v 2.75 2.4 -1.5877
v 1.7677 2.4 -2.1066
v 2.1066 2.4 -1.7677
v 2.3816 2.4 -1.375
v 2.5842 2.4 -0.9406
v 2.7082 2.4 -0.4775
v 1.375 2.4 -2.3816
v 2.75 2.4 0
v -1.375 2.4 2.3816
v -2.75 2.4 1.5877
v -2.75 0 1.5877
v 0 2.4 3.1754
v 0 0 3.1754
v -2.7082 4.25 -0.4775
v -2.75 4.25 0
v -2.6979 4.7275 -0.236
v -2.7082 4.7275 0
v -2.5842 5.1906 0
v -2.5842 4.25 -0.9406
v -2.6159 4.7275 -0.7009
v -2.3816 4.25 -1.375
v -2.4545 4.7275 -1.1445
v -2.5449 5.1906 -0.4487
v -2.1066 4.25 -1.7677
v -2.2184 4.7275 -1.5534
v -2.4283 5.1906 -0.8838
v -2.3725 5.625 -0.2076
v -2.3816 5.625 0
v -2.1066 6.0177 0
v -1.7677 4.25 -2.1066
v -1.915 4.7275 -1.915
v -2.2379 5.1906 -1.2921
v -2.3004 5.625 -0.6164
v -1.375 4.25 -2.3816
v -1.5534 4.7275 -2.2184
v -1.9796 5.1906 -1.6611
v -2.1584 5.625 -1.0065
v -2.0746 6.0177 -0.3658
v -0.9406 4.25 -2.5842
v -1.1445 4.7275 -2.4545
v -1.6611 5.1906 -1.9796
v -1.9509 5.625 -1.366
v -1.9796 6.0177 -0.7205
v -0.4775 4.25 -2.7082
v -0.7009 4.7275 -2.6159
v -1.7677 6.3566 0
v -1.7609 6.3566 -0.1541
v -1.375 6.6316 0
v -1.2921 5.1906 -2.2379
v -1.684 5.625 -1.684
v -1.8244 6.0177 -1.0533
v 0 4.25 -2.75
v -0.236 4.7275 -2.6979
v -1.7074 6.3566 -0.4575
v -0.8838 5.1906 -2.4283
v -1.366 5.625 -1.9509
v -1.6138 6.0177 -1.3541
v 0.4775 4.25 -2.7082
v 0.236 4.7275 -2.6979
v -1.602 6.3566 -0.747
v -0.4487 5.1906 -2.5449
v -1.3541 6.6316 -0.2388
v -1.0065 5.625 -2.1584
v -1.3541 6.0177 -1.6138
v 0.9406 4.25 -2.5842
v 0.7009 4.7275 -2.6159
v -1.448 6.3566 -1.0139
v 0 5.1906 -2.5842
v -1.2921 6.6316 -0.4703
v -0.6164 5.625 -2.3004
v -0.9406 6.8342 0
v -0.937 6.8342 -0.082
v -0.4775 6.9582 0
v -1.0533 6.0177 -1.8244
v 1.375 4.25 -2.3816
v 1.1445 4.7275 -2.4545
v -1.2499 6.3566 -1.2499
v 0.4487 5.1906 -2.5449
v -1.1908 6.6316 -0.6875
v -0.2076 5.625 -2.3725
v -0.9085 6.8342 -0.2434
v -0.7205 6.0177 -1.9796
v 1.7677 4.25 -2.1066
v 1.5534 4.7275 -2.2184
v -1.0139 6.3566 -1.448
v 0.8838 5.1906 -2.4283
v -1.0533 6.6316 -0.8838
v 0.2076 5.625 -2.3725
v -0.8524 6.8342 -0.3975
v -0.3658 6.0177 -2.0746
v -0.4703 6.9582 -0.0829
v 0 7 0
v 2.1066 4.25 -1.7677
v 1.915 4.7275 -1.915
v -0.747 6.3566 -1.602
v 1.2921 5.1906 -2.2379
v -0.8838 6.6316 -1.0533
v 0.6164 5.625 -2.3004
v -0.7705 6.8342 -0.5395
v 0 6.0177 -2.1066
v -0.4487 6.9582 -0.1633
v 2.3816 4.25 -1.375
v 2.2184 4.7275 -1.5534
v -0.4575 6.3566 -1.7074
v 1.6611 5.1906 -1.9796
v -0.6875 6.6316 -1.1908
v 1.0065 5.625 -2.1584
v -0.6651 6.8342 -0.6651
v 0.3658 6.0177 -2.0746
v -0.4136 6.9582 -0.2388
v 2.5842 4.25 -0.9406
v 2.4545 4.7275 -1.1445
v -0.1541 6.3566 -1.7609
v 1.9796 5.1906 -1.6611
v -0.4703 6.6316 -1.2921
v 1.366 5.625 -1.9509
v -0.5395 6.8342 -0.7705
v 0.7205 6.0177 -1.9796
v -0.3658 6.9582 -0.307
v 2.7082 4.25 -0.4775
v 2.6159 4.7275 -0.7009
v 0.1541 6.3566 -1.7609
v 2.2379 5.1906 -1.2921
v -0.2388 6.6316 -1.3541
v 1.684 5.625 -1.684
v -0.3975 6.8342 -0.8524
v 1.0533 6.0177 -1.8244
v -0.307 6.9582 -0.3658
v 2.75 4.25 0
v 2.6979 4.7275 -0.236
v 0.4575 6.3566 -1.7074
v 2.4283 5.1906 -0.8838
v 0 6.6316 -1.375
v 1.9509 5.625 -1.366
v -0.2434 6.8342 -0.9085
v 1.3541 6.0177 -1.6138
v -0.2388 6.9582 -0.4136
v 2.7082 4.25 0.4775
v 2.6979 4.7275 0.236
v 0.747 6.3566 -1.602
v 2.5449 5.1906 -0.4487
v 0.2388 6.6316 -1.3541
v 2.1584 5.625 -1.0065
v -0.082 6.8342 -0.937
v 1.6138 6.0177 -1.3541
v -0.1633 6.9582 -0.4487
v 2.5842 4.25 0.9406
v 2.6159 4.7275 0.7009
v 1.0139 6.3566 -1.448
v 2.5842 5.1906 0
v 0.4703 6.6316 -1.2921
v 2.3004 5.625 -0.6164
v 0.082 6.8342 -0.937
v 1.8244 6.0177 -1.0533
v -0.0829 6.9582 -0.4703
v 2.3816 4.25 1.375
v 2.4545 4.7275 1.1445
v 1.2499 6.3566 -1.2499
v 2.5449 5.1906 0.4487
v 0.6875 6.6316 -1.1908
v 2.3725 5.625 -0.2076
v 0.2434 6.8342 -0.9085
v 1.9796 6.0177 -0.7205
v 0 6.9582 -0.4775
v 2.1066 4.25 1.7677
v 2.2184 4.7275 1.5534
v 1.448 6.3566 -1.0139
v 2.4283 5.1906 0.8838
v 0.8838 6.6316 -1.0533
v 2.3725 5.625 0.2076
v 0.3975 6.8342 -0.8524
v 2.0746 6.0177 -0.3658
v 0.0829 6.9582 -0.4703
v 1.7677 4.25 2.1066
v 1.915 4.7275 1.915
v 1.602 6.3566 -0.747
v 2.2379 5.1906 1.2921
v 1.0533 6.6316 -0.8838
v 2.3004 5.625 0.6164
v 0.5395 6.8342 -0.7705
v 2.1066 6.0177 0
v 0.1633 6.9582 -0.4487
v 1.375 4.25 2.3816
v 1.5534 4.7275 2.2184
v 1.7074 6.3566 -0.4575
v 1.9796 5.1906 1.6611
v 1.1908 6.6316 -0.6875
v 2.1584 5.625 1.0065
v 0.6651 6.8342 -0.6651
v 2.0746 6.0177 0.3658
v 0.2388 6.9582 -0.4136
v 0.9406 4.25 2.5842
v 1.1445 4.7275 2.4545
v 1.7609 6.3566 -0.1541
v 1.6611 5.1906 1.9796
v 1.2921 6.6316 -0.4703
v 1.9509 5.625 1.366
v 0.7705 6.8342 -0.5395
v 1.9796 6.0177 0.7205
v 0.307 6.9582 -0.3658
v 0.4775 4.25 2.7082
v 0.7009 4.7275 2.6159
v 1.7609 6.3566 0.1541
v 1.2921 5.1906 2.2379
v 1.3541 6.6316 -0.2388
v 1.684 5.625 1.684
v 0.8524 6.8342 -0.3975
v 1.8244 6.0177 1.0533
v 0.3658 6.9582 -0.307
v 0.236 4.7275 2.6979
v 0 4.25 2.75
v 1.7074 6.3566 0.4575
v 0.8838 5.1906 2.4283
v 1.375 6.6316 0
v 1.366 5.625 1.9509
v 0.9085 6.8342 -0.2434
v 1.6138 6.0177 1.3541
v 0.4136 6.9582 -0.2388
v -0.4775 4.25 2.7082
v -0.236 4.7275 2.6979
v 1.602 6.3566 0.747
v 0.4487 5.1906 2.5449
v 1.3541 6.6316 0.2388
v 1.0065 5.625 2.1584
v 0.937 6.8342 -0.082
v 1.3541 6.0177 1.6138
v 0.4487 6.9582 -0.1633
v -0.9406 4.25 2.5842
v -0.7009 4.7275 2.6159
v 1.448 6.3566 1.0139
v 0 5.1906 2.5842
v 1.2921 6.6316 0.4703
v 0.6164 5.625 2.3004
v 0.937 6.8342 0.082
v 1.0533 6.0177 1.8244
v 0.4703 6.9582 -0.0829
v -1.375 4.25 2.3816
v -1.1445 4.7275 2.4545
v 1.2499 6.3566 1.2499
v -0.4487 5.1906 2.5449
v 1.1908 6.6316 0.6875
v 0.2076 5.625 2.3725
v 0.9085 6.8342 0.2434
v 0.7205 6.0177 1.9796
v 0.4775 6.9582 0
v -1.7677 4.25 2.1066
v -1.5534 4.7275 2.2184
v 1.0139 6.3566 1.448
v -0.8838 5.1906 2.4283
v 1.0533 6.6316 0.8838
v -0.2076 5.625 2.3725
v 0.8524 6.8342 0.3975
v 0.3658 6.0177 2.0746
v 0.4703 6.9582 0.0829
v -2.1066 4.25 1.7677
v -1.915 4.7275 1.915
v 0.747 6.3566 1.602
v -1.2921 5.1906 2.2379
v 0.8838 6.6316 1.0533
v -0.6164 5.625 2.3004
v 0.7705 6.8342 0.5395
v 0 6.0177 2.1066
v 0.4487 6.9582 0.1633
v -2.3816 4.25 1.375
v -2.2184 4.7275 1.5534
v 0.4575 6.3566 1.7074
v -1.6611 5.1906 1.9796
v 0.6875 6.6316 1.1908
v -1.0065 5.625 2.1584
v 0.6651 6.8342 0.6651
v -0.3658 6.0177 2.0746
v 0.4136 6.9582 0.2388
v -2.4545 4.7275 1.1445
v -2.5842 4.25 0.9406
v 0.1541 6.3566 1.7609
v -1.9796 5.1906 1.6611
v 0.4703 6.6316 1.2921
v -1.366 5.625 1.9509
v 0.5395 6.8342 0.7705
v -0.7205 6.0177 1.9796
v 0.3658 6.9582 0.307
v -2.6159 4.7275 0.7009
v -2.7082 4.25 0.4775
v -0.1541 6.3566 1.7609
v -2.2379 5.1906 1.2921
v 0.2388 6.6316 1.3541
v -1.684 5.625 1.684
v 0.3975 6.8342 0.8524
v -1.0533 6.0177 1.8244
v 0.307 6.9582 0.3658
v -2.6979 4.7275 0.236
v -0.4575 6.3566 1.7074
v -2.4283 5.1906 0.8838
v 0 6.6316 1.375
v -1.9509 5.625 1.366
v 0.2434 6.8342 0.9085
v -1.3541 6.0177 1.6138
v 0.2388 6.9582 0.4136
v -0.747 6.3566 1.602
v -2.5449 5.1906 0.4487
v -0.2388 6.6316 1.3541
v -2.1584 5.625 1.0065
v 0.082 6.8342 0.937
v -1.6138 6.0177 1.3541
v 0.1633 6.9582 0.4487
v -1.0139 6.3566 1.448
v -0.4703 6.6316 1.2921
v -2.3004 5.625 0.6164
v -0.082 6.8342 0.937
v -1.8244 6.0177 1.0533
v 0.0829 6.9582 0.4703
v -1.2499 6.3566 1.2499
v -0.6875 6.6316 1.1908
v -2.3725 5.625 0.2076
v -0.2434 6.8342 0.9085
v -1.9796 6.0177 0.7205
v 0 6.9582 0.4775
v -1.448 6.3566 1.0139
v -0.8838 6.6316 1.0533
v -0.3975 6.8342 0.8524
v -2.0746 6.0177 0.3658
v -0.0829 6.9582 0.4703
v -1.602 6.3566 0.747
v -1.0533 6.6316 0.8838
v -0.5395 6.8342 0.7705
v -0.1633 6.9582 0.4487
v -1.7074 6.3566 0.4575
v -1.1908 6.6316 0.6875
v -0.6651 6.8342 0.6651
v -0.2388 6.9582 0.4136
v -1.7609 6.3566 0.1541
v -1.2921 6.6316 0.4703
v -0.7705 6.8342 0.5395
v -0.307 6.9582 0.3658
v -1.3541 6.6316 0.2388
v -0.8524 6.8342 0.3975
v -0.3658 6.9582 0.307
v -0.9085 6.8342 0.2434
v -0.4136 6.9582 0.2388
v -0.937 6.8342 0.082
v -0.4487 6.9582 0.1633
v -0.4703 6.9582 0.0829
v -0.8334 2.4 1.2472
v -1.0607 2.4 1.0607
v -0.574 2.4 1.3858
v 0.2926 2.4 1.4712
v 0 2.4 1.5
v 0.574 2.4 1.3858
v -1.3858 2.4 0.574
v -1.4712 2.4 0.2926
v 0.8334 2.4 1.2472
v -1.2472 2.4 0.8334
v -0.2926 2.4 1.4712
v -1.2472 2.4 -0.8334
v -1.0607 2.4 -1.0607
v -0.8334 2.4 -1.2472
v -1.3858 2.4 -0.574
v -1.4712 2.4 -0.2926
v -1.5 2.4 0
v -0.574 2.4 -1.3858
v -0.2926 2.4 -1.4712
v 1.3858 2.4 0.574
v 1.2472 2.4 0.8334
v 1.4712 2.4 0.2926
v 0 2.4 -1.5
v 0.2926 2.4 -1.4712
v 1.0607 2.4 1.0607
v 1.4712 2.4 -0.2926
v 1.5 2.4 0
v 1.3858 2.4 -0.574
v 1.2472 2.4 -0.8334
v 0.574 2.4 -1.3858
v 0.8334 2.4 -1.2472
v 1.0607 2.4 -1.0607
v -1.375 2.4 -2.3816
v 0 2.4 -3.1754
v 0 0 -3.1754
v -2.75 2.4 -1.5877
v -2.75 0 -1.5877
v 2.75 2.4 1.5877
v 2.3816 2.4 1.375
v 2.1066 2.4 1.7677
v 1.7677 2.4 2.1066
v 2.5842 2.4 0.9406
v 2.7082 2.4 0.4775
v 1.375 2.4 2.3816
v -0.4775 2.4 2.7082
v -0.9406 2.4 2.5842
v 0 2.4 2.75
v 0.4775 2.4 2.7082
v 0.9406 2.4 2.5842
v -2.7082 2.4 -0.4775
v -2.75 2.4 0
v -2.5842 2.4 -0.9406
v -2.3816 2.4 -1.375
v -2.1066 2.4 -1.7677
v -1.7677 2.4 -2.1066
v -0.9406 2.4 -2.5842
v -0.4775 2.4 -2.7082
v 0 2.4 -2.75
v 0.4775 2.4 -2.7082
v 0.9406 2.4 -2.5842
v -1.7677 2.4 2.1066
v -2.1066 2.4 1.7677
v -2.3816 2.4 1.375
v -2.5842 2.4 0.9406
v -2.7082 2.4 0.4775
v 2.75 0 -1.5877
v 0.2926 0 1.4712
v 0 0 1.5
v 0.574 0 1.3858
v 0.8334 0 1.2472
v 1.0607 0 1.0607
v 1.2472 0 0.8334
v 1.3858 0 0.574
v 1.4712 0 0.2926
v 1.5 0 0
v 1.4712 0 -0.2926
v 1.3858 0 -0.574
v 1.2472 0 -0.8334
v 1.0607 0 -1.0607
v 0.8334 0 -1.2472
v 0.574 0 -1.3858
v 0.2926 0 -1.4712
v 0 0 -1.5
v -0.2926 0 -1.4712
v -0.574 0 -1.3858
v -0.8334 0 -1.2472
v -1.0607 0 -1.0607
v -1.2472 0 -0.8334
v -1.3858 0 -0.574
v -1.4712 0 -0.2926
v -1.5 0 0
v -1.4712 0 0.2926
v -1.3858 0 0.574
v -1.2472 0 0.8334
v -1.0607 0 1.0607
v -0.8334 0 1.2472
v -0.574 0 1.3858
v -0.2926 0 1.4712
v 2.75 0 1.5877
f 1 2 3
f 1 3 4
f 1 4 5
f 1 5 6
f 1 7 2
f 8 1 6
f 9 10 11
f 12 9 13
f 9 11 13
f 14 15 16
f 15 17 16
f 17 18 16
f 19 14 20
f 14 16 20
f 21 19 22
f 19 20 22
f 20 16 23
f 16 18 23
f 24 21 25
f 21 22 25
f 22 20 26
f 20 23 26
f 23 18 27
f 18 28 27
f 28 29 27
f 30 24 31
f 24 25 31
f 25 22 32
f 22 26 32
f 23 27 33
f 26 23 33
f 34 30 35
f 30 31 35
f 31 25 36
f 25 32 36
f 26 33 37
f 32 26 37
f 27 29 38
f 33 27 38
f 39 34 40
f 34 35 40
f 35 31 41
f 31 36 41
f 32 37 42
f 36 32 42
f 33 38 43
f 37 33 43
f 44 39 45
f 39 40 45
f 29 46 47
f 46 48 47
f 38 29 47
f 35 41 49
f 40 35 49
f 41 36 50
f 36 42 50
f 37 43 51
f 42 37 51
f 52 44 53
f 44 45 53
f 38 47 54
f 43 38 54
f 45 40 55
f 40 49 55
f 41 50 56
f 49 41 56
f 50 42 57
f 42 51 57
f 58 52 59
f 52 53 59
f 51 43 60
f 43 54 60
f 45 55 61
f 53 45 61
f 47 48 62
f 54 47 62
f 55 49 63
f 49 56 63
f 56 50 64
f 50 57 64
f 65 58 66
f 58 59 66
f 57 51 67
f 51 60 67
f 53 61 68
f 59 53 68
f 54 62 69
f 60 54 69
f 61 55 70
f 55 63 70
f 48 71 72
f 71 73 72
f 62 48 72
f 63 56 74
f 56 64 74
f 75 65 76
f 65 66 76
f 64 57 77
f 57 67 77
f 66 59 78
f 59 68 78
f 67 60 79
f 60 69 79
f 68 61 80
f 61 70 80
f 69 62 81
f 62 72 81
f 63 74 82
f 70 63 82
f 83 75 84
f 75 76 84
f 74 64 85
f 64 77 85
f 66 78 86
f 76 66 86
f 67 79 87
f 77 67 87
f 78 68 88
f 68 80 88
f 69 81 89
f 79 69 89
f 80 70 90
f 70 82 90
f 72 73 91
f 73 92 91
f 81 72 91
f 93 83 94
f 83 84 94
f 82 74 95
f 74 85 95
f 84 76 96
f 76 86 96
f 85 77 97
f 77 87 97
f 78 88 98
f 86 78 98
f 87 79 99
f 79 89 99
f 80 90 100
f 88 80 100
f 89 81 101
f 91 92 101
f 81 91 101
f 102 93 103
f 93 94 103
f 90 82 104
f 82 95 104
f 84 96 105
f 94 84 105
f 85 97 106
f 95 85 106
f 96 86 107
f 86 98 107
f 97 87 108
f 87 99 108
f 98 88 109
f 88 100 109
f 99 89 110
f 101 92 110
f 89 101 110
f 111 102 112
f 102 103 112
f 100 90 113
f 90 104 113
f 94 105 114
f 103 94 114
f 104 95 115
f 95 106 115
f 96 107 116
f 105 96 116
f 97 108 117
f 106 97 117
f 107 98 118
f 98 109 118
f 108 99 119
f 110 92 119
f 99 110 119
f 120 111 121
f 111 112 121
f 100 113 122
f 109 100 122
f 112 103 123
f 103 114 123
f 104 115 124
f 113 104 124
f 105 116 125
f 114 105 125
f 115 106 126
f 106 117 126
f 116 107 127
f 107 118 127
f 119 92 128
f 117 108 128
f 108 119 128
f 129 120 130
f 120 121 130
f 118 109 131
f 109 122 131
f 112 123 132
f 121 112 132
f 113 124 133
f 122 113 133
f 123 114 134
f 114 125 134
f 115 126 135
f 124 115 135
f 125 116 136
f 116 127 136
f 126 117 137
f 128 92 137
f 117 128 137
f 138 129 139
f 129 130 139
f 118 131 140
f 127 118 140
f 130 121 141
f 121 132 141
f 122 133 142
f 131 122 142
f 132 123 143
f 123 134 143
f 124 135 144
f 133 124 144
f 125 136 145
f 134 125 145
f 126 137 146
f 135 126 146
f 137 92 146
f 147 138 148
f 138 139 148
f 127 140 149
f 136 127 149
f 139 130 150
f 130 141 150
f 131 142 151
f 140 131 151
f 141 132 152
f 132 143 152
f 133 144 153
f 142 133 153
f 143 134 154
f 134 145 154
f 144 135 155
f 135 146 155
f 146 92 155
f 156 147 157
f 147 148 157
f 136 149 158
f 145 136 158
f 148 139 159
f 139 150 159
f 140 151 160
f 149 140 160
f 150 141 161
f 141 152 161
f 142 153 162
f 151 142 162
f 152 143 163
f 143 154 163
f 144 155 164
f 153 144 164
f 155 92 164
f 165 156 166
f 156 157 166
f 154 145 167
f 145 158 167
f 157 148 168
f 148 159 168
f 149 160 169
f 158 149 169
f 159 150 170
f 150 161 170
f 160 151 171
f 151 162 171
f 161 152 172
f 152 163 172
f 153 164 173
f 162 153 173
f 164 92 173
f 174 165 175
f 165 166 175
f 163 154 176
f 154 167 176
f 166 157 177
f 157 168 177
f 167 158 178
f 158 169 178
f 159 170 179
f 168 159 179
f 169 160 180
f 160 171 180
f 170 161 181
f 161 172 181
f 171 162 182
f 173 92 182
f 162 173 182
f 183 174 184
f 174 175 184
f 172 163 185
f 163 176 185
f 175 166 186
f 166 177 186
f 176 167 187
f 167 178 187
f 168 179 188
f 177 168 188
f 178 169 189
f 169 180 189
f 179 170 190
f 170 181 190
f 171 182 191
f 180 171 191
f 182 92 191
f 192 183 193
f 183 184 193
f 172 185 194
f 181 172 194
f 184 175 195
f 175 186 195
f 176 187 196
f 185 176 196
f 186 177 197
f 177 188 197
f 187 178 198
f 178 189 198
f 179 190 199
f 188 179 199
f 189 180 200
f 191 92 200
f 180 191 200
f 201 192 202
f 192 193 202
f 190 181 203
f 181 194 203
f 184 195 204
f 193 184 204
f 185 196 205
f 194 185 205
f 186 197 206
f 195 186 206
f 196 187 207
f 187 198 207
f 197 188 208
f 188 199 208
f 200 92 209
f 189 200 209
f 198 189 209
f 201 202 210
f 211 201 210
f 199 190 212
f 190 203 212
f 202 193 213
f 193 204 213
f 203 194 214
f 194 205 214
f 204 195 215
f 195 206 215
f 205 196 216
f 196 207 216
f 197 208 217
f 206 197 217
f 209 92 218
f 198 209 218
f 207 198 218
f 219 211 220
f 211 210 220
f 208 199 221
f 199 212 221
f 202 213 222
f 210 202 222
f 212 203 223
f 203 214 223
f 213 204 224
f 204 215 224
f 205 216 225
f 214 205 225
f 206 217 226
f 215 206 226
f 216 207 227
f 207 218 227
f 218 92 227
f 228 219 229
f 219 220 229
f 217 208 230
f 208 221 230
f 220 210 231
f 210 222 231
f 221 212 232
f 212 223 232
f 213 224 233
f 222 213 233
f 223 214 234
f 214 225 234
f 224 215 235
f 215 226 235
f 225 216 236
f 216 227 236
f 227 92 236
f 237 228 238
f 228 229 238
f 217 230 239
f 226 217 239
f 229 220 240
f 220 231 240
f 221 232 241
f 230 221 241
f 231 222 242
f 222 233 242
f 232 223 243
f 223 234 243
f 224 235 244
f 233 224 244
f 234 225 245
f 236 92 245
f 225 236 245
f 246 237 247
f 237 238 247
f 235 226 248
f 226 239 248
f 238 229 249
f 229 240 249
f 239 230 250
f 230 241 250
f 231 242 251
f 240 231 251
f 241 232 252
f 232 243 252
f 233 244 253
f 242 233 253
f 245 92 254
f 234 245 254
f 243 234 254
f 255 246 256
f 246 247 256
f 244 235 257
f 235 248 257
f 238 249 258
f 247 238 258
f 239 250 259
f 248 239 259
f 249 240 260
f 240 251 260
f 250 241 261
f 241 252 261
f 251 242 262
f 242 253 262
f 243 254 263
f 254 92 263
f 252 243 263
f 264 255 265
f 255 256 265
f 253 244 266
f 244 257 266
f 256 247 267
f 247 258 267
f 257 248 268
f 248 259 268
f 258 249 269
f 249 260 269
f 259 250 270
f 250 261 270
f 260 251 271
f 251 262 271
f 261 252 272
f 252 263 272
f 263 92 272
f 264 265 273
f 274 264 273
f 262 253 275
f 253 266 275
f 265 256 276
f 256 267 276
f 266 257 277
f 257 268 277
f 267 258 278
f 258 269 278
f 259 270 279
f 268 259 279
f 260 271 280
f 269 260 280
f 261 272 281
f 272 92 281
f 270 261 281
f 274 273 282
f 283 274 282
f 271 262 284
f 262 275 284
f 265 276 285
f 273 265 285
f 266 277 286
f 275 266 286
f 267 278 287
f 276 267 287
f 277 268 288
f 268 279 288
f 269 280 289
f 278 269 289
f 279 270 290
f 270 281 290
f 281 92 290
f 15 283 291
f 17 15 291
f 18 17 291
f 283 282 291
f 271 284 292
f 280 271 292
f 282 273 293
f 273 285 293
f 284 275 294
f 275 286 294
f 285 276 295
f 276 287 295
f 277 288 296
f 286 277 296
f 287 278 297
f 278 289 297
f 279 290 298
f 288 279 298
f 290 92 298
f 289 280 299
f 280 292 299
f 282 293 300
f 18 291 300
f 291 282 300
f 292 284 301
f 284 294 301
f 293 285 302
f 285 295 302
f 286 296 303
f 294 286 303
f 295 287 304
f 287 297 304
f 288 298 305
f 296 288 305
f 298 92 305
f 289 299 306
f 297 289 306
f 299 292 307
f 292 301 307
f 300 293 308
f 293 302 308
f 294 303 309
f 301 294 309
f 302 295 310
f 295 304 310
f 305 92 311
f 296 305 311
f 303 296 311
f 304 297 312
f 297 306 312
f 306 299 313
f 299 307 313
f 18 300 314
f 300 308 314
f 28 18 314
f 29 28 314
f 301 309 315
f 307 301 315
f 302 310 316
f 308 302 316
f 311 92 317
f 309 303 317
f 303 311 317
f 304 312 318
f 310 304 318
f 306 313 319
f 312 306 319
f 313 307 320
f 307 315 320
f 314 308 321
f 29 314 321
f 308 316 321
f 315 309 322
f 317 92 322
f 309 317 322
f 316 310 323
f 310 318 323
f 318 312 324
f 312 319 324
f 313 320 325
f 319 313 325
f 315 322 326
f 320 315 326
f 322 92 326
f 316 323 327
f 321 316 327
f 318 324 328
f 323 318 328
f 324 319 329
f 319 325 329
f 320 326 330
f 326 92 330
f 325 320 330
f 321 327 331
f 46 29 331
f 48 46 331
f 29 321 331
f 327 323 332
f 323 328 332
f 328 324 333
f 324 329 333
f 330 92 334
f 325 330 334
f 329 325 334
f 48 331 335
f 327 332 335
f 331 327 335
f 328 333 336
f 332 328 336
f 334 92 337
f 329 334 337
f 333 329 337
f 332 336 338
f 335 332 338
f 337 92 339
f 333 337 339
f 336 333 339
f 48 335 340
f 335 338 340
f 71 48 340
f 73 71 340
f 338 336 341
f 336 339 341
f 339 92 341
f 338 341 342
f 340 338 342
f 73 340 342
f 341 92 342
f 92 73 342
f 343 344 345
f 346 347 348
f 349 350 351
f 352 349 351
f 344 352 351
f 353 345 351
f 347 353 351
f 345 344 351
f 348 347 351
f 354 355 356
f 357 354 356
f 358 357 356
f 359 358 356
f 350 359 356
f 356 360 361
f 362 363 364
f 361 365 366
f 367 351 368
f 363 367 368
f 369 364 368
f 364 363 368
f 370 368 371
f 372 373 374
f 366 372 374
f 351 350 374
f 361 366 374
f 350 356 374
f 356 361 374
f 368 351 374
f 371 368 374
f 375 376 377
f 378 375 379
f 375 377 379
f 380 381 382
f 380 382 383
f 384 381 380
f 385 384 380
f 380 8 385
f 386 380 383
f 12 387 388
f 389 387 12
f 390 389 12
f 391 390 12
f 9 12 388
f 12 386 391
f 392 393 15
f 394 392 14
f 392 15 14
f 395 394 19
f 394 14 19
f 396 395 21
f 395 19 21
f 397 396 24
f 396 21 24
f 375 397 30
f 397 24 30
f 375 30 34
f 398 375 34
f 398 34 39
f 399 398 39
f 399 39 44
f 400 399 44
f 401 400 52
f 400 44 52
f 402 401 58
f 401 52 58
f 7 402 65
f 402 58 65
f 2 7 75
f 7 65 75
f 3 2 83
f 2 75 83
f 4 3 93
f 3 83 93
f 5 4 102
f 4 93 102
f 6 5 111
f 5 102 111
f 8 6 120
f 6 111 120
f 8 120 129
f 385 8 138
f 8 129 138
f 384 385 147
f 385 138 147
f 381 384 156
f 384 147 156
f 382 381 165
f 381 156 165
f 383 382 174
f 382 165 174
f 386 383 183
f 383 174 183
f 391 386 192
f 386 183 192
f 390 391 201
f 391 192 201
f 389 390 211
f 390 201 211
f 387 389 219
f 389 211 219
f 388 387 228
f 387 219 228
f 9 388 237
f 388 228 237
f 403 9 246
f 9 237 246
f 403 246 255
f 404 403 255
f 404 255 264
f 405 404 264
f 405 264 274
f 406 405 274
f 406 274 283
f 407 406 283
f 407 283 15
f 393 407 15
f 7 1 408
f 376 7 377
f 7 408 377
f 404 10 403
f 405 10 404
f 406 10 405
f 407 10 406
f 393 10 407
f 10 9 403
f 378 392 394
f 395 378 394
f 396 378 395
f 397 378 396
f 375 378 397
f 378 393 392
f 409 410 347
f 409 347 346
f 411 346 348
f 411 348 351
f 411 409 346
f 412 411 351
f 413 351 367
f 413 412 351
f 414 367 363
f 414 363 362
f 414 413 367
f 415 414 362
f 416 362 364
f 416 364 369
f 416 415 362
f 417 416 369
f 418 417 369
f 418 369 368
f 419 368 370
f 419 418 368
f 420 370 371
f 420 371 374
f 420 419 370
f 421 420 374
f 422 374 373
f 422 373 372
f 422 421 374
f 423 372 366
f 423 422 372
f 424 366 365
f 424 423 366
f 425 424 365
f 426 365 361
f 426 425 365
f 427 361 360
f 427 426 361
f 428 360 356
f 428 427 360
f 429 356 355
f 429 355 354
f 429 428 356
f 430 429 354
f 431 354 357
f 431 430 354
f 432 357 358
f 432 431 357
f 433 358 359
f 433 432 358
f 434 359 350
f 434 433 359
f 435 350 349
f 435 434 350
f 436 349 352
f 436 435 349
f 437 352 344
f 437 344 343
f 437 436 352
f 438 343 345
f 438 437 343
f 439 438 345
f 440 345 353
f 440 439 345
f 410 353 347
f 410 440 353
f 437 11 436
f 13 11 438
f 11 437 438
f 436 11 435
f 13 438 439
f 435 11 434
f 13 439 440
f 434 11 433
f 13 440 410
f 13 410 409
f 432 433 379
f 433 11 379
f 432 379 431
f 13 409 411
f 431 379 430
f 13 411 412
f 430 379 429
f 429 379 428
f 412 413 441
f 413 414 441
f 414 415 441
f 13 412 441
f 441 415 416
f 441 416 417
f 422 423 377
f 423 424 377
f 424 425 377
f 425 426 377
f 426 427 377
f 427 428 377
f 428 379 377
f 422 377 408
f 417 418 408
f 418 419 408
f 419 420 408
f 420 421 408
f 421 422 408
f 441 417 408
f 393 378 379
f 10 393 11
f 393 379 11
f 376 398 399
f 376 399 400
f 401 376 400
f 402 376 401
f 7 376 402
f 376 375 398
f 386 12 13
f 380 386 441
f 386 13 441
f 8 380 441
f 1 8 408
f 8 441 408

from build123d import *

# Parameters (mm, degrees)
SZKIC1_R                    = 1.5
DODANIE_WYCI_GNI_CIE1_DEPTH = 2.4


with BuildPart() as part:
    # Szkic1 → Dodanie-wyciągnięcie1 (new body)
    with BuildSketch(Plane(origin=(0, 0, 0), x_dir=(1, 0, 0), z_dir=(0, 1, 0))):
        Polygon((0, 3.175426481), (-2.75, 1.58771324), (-2.75, -1.58771324), (0, -3.175426481), (2.75, -1.58771324), (2.75, 1.58771324), align=None)
        with Locations(Location((0, 0, 0), (0, 0, 270))):
            Circle(SZKIC1_R, mode=Mode.SUBTRACT)
    extrude(amount=DODANIE_WYCI_GNI_CIE1_DEPTH)

    # Szkic3 → Obrót2 (revolve)
    with BuildSketch(Plane.XY, mode=Mode.PRIVATE) as obr_t2_sk:
        with BuildLine():
            Line((0, 7), (0, 2.4))
            Line((0, 2.4), (2.75, 2.4))
            Line((2.75, 2.4), (2.75, 4.25))
            ThreePointArc((2.75, 4.25), (1.944543648, 6.194543648), (0, 7))
        make_face()
    revolve(obr_t2_sk.sketch.rotate(Axis((0, 7, 0), (0, -1, 0)), 180), axis=Axis((0, 7, 0), (0, -1, 0)))


solid = part.part
